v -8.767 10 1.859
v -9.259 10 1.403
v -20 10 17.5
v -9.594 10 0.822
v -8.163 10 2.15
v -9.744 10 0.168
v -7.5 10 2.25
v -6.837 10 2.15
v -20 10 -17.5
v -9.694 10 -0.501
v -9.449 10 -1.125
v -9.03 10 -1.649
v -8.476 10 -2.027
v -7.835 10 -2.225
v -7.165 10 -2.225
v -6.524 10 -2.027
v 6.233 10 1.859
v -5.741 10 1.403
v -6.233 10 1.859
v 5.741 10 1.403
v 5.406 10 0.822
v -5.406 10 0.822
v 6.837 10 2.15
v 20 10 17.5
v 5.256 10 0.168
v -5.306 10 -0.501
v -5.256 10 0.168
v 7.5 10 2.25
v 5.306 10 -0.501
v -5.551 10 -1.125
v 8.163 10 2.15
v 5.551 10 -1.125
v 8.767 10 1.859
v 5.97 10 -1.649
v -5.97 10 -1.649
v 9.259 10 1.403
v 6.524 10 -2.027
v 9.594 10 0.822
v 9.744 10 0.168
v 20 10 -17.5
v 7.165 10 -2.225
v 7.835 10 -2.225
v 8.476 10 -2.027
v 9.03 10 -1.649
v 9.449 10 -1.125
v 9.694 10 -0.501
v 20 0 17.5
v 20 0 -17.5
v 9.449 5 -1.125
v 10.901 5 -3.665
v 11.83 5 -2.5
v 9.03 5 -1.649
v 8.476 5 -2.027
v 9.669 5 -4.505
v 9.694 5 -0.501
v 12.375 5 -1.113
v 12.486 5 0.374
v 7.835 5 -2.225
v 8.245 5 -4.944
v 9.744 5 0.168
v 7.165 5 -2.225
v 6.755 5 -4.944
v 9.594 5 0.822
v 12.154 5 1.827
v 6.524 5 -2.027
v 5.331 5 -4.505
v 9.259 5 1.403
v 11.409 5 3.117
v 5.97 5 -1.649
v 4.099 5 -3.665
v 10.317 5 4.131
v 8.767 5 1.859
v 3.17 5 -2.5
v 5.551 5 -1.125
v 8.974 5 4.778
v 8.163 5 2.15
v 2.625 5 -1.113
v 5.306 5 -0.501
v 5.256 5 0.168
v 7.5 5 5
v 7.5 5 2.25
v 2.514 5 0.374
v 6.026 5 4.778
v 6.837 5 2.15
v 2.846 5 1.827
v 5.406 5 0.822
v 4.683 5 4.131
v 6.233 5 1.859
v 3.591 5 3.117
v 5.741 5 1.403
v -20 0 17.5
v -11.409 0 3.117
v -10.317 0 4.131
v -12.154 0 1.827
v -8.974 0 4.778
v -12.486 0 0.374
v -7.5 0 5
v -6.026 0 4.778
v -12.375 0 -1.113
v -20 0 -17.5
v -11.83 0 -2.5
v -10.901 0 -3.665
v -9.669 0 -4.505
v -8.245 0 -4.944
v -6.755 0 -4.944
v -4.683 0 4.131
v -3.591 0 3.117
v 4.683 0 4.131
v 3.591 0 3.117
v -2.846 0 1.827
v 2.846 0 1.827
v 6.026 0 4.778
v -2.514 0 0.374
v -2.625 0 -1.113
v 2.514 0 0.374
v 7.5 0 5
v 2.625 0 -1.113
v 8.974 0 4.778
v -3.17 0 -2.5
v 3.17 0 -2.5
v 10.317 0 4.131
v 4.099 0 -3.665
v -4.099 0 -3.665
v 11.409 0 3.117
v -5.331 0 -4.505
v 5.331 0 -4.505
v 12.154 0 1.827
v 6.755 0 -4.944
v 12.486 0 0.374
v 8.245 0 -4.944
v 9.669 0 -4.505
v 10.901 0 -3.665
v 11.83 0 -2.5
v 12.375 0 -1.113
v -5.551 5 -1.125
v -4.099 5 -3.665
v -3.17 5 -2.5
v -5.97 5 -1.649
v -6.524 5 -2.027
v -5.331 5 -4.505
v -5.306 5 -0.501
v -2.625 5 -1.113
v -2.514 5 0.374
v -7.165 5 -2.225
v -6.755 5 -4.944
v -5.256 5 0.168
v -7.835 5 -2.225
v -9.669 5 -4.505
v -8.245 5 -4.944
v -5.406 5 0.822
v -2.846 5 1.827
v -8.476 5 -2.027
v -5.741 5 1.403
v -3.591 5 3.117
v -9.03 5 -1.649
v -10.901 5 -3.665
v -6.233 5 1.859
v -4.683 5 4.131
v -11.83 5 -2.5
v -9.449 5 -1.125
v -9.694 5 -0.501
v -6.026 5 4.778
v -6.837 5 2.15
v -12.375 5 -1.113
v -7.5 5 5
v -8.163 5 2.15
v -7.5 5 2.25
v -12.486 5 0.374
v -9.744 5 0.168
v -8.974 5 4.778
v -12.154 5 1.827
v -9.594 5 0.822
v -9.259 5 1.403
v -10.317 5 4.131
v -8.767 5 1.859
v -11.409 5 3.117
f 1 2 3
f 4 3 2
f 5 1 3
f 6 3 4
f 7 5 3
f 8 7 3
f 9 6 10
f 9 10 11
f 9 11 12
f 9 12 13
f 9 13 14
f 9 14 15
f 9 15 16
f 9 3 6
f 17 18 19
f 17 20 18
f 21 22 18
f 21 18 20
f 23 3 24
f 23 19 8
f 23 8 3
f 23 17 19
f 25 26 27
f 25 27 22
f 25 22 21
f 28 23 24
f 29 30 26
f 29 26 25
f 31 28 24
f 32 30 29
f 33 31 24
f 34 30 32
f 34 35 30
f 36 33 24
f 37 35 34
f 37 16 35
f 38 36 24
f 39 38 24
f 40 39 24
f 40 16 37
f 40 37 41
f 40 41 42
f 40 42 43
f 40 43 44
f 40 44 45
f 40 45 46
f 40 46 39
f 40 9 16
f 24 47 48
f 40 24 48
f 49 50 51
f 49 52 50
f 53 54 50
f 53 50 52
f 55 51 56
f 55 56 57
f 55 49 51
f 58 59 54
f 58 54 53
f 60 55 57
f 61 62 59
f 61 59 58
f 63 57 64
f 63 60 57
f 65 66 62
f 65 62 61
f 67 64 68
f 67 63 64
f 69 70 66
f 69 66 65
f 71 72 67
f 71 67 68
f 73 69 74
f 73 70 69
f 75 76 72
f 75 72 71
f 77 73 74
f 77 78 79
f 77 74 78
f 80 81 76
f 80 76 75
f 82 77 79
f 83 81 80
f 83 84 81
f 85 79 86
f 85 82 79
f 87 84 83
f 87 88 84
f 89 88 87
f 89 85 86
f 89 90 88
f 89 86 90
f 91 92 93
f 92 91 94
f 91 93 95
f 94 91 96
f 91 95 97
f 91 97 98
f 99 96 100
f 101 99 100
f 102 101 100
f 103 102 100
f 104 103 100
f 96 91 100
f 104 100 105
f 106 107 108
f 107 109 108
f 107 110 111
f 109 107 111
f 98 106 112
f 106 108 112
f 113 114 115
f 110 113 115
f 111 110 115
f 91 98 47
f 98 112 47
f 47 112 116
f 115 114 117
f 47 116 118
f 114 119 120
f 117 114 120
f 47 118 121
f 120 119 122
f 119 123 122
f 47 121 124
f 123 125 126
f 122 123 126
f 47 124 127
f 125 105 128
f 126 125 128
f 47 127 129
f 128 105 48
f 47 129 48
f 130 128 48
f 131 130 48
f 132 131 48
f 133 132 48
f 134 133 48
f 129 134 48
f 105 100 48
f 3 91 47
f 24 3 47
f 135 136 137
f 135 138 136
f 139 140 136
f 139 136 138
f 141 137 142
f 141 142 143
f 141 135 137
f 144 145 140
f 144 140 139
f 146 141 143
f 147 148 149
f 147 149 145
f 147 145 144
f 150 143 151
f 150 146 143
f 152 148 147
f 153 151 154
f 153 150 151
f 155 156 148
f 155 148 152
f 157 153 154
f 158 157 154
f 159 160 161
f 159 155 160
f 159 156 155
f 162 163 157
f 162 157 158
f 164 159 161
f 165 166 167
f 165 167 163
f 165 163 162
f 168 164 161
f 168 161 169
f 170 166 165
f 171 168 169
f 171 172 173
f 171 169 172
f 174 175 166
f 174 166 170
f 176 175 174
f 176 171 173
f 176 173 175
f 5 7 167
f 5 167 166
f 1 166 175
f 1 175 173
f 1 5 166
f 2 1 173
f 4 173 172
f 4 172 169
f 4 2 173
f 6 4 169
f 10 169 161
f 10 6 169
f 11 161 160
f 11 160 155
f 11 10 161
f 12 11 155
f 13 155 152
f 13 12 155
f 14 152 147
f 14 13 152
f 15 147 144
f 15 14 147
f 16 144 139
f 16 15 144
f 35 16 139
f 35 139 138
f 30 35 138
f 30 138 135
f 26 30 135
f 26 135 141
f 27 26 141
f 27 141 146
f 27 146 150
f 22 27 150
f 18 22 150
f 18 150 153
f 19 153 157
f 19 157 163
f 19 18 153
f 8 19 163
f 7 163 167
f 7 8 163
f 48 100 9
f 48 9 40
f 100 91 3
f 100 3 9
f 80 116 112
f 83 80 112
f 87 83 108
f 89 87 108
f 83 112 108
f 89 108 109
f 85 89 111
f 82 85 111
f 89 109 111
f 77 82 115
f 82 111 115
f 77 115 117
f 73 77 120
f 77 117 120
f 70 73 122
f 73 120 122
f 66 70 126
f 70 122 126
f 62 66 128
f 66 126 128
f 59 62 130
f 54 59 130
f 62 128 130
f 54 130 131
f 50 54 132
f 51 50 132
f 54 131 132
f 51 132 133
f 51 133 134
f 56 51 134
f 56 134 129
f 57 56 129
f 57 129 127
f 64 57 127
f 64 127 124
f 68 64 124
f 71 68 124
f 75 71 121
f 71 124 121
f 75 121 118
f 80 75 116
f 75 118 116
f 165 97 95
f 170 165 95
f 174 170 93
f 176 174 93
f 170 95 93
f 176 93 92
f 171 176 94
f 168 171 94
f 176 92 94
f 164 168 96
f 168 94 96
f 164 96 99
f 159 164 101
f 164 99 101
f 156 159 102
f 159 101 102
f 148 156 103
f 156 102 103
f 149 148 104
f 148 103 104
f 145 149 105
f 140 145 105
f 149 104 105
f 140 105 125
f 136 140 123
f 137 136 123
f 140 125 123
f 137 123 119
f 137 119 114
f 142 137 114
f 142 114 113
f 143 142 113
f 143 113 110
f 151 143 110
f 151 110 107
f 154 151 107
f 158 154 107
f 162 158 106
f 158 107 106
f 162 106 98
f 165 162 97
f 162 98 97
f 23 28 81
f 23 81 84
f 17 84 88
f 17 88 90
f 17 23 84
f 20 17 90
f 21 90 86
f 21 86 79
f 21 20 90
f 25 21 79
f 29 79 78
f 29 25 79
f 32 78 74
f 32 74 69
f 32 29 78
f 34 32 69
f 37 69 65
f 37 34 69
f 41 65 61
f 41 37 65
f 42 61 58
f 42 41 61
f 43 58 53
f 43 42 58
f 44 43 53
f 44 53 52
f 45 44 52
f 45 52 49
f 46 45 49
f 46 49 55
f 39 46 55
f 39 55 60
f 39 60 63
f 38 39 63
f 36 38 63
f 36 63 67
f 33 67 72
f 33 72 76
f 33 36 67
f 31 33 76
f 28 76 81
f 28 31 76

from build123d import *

# Parameters (mm, degrees)
SKETCH1_W           = 40
SKETCH1_H           = 35
BOSS_EXTRUDE1_DEPTH = 10
F_3DSKETCH1_R       = 2.25
CUT_EXTRUDE1_DEPTH  = 5
F_3DSKETCH2_R       = 5
CUT_EXTRUDE2_DEPTH  = 5


with BuildPart() as part:
    # Sketch1 → Boss-Extrude1 (new body)
    with BuildSketch(Plane(origin=(0, 0, 0), x_dir=(1, 0, 0), z_dir=(0, 1, 0))):
        Rectangle(SKETCH1_W, SKETCH1_H)
    extrude(amount=BOSS_EXTRUDE1_DEPTH)

    # 3DSketch1 → Cut-Extrude1 (cut)
    with BuildSketch(Plane(origin=(-7.5, 10, 0), x_dir=(1, 0, 0), z_dir=(0, -1, 0))):
        with Locations(Location((0, 0, 0), (0, 0, 90))):
            Circle(F_3DSKETCH1_R)
        with Locations(Location((15, 0, 0), (0, 0, 90))):
            Circle(F_3DSKETCH1_R)
    extrude(amount=CUT_EXTRUDE1_DEPTH, mode=Mode.SUBTRACT)

    # 3DSketch2 → Cut-Extrude2 (cut)
    with BuildSketch(Plane(origin=(-7.5, 0, 0), x_dir=(1, 0, 0), z_dir=(0, -1, 0))):
        with Locations(Location((0, 0, 0), (0, 0, 90))):
            Circle(F_3DSKETCH2_R)
        with Locations(Location((15, 0, 0), (0, 0, 90))):
            Circle(F_3DSKETCH2_R)
    extrude(amount=-CUT_EXTRUDE2_DEPTH, mode=Mode.SUBTRACT)


solid = part.part
